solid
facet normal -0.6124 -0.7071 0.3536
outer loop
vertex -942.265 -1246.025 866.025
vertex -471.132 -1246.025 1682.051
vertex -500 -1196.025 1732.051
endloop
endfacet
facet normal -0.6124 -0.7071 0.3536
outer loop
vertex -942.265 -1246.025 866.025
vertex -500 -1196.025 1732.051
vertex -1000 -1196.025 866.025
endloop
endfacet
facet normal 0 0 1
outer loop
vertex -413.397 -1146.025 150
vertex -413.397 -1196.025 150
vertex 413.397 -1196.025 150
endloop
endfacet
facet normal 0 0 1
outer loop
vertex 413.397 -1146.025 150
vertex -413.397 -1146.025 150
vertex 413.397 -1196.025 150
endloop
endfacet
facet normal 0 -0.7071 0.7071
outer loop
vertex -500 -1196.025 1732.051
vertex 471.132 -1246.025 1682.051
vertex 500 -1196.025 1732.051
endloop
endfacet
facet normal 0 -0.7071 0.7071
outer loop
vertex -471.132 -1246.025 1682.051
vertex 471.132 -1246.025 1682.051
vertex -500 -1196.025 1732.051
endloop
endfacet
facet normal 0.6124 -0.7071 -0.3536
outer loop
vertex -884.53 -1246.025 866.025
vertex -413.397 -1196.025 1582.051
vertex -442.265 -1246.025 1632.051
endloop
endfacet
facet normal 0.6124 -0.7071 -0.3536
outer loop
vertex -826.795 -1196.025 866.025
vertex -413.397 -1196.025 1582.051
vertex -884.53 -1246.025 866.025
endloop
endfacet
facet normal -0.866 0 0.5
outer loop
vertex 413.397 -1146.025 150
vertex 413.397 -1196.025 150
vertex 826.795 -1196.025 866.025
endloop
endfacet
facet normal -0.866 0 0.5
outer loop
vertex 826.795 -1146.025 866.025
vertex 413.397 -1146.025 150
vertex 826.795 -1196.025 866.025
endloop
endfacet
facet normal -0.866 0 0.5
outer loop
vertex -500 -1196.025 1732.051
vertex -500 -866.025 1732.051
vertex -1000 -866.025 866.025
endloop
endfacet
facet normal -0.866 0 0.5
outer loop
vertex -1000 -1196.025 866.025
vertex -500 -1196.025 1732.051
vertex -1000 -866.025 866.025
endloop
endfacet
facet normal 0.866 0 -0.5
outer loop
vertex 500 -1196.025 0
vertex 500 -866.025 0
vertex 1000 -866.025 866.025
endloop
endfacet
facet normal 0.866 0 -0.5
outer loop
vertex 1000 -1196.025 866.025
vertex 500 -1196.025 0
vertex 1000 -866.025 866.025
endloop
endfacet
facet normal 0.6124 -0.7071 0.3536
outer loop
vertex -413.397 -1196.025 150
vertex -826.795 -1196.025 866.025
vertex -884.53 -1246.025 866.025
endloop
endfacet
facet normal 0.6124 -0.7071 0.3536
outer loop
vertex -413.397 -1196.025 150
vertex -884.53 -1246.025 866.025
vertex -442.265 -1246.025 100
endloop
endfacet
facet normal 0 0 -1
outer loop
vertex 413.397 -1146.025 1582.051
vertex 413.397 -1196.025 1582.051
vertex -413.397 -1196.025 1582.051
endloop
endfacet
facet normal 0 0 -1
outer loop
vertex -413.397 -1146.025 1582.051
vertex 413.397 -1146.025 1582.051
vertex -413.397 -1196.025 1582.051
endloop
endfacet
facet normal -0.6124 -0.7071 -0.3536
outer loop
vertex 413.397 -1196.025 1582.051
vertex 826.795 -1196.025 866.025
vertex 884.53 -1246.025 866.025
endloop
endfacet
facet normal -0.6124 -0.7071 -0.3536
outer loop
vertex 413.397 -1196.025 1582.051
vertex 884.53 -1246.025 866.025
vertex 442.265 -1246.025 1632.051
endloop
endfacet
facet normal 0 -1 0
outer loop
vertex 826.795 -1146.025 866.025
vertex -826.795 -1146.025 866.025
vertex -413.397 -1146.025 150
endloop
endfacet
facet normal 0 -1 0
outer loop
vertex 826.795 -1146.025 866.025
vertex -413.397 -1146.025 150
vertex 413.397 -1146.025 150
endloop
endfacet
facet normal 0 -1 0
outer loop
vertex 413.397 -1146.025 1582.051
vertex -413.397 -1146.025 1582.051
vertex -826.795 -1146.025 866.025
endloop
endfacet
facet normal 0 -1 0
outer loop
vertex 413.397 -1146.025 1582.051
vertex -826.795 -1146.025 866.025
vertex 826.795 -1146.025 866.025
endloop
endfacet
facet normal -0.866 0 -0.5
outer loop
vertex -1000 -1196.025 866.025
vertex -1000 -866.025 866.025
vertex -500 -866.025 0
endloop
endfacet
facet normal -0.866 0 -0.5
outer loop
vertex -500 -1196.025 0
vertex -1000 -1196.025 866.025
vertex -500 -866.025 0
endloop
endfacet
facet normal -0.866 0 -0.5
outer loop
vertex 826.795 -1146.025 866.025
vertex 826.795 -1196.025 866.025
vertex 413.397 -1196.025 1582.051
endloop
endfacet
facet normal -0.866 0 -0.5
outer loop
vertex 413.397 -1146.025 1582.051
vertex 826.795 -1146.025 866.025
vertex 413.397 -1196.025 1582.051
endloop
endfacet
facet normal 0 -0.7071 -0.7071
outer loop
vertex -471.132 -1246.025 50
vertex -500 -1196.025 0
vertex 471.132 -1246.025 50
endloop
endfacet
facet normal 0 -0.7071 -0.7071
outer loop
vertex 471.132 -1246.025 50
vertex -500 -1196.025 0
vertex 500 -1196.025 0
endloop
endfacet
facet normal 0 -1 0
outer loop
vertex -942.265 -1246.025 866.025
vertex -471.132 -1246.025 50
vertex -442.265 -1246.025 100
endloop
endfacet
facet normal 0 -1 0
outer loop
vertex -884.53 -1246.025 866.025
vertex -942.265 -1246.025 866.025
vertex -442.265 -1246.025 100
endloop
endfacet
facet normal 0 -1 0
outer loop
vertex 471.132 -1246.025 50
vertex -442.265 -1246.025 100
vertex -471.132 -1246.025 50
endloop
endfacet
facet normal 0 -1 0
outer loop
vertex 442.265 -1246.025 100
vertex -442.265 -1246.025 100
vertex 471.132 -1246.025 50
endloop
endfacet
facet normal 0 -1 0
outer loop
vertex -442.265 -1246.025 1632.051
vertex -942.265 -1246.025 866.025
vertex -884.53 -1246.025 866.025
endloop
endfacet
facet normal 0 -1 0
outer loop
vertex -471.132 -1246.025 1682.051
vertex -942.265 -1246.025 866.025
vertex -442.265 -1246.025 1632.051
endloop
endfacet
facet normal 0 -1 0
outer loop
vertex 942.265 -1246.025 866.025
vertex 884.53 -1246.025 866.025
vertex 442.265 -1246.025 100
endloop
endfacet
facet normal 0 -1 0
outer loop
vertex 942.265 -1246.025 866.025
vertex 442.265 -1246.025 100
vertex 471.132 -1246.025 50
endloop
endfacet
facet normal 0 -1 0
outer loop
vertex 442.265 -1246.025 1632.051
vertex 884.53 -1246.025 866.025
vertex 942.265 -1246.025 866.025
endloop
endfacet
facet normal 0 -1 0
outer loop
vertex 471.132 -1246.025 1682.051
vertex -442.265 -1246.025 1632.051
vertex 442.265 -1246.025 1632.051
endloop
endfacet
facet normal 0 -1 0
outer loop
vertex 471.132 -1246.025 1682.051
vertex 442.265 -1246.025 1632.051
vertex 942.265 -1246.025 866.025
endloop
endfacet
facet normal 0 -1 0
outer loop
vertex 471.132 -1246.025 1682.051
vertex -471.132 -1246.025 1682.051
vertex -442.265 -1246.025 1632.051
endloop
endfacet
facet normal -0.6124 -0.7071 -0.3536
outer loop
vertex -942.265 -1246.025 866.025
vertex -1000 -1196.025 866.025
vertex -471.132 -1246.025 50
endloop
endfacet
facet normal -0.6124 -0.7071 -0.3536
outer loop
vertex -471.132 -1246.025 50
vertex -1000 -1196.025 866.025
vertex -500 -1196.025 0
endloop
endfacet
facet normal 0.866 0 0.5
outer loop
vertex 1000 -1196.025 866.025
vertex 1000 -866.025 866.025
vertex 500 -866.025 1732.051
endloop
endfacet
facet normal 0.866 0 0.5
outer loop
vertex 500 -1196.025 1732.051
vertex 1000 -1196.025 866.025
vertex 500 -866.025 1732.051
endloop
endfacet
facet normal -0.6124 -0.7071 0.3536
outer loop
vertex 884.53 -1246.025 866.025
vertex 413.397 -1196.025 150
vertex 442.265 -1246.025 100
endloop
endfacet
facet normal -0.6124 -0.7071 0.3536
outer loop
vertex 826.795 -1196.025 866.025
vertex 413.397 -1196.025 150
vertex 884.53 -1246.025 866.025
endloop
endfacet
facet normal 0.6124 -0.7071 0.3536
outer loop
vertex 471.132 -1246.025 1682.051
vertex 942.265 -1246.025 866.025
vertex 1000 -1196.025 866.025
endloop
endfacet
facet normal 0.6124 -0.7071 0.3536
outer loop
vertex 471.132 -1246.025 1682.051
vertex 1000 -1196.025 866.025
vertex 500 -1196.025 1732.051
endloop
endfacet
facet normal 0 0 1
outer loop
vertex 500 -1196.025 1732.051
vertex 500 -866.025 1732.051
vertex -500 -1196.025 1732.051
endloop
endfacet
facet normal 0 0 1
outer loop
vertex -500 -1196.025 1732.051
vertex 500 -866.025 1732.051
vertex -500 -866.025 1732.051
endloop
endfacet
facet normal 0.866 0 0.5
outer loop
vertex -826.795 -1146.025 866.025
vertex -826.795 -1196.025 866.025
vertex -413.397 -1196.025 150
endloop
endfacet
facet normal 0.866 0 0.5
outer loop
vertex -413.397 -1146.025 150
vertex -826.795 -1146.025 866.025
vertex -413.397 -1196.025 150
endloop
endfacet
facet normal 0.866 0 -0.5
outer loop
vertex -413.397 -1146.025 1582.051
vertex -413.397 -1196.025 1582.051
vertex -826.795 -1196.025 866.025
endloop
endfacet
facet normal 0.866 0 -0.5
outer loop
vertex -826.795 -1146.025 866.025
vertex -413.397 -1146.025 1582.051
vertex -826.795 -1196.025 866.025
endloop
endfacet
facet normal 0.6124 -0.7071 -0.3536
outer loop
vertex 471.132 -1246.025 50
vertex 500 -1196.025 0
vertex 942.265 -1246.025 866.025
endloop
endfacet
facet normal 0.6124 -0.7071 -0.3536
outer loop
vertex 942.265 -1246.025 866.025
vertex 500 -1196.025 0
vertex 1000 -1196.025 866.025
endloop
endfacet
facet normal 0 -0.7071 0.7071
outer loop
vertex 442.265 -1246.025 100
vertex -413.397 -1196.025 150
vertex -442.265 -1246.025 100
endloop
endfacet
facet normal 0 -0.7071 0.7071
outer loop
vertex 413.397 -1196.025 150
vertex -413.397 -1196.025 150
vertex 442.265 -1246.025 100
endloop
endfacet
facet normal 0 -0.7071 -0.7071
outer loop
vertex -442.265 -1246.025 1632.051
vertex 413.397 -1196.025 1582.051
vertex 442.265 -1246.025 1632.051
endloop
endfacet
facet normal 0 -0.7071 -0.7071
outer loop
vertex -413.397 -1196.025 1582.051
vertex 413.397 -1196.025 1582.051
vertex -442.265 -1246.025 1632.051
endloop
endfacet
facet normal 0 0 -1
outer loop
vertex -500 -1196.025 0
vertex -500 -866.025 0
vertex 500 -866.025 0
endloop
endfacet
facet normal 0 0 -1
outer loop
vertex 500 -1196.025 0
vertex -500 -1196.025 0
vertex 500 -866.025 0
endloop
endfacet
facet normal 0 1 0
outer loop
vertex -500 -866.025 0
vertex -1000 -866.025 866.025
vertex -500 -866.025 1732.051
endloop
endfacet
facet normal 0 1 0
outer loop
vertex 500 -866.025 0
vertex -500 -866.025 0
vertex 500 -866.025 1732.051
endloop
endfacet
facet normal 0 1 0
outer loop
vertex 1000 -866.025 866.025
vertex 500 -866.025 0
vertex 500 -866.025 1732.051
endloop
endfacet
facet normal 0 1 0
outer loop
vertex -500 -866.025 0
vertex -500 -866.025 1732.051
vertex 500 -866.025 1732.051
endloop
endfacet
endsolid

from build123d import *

# Parameters (mm, degrees)
F1_DEPTH = 380
F3_DEPTH = 100
F4_SIZE  = 50
F5_ANGLE = -90


with BuildPart() as f1:
    # F0 (on Top) → F1 (new body)
    with BuildSketch(Plane.XY):
        Polygon((500, 866.0254037844), (-500, 866.0254037844), (-1000, 0), (-500, -866.0254037844), (500, -866.0254037844), (1000, 0), align=None)
    extrude(amount=F1_DEPTH)

    # F2 (on face) → F3 (cut)
    with BuildSketch(Plane.XY.offset(380)):
        Polygon((-826.7949192431, 0), (-413.3974596216, -716.0254037844), (413.3974596216, -716.0254037844), (826.7949192431, 0), (413.3974596216, 716.0254037844), (-413.3974596216, 716.0254037844), align=None)
    extrude(amount=-F3_DEPTH, mode=Mode.SUBTRACT)

    # F4
    f4_edges = [f1.edges().sort_by_distance(p)[0] for p in [
        (0, 866.025404, 380),
        (750, 433.012702, 380),
        (-750, 433.012702, 380),
        (750, -433.012702, 380),
        (-750, -433.012702, 380),
        (0, -866.025404, 380),
        (0, 716.025404, 380),
        (-620.096189, 358.012702, 380),
        (-620.096189, -358.012702, 380),
        (0, -716.025404, 380),
        (620.096189, -358.012702, 380),
        (620.096189, 358.012702, 380),
    ]]
    chamfer(f4_edges, length=F4_SIZE)


with BuildPart() as f1_1:
    # F5: moved
    add(f1.part.rotate(Axis((0, -866.0254037844, 0), (-1, 0, 0)), F5_ANGLE))


solid = f1_1.part
